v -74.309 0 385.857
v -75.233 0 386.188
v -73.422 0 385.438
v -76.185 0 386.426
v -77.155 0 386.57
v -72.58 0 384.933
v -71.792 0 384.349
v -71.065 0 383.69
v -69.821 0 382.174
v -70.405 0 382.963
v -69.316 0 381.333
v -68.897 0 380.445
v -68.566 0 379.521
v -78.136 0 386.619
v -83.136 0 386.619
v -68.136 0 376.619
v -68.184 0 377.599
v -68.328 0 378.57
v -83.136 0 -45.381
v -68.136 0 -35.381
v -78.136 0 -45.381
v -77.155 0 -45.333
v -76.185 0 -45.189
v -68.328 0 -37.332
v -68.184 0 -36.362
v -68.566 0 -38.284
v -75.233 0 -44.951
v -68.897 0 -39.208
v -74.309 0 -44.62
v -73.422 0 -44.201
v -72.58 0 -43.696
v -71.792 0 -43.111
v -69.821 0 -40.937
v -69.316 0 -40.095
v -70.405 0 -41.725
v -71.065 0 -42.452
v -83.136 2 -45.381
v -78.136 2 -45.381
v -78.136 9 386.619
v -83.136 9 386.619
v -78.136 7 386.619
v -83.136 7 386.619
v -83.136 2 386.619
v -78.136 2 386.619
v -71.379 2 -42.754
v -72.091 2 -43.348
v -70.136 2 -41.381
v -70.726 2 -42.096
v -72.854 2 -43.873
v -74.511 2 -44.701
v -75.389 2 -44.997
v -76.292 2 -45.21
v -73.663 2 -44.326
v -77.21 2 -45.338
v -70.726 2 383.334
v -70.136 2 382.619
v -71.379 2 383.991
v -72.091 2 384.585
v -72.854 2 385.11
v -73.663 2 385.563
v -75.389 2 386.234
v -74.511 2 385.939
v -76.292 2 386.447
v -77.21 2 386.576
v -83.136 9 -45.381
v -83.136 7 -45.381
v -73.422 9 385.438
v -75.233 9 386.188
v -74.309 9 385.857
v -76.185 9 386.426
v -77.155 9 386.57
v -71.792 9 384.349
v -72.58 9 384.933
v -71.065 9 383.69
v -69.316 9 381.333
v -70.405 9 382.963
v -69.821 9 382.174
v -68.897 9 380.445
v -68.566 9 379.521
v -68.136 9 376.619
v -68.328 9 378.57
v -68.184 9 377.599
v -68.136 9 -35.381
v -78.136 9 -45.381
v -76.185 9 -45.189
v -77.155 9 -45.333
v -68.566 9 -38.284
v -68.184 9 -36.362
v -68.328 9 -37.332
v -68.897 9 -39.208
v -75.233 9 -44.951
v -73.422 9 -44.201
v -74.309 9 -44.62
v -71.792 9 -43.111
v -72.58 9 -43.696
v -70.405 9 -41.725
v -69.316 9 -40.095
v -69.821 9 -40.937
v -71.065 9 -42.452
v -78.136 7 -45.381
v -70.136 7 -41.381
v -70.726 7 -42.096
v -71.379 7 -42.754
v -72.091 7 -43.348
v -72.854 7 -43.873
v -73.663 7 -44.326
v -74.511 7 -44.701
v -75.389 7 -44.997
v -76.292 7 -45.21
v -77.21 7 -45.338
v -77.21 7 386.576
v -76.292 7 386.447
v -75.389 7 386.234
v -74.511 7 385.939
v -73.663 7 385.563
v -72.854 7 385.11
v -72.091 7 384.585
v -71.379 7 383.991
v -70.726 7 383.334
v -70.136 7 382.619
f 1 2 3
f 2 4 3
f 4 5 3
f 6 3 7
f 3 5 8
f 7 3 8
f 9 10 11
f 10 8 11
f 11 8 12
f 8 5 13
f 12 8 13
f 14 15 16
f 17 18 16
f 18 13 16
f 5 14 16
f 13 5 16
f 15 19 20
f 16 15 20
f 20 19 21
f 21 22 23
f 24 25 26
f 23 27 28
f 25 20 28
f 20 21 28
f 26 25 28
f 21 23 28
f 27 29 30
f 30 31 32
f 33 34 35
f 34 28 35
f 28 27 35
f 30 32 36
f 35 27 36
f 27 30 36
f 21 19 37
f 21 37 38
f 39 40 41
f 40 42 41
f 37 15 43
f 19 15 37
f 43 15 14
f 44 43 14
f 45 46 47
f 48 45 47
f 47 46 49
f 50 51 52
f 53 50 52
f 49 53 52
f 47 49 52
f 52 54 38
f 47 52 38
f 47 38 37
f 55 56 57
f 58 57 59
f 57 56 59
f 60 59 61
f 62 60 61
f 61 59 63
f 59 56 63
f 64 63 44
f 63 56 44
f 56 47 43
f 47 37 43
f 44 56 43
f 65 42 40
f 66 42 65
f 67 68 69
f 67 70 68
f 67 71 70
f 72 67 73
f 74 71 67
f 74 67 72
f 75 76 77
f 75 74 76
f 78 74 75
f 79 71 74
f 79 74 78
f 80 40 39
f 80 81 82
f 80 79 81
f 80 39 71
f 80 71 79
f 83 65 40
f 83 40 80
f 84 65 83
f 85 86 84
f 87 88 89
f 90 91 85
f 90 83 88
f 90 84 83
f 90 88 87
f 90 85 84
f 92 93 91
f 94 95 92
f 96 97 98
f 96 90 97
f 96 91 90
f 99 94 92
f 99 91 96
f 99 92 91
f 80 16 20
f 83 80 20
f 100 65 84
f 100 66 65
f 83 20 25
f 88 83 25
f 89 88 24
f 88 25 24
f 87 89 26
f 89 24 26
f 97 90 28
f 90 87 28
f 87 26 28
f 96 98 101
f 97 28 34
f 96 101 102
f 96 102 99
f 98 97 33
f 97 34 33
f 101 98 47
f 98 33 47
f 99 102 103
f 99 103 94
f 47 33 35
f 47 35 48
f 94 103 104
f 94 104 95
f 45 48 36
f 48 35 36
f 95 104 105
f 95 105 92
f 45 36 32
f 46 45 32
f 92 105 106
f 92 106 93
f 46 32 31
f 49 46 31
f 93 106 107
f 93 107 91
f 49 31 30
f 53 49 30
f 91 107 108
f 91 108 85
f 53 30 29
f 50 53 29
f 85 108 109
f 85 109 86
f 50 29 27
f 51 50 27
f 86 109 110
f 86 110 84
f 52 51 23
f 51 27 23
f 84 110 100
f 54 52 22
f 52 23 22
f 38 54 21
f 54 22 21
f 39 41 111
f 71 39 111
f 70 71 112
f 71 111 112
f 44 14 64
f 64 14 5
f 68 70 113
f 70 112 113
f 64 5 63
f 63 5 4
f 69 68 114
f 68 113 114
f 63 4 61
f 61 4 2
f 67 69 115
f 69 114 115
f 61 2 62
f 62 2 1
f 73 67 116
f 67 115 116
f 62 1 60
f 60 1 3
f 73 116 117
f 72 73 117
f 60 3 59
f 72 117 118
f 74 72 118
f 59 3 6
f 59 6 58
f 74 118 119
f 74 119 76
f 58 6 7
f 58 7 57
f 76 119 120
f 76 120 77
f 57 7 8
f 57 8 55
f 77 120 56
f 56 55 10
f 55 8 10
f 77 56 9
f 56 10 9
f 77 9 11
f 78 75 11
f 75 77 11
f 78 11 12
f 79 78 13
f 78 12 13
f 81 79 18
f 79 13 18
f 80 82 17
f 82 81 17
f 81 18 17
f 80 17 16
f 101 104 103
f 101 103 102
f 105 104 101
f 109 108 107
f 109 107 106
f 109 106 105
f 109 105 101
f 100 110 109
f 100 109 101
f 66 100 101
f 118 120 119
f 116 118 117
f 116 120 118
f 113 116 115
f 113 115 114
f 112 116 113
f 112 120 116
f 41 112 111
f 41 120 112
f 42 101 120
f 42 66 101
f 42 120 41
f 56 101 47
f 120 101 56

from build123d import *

# Parameters (mm, degrees)
SKETCH2_W           = 15
SKETCH2_H           = 432
BOSS_EXTRUDE1_DEPTH = 9
SKETCH3_W           = 432
SKETCH3_H           = 5
CUT_EXTRUDE1_DEPTH  = 13
FILLET1_R           = 10
FILLET2_R           = 10


with BuildPart() as part:
    # Sketch2 → Boss-Extrude1 (new body)
    with BuildSketch(Plane(origin=(0, 0, 0), x_dir=(1, 0, 0), z_dir=(0, 1, 0))):
        with Locations((-75.63559322, -170.618644068)):
            Rectangle(SKETCH2_W, SKETCH2_H)
    extrude(amount=BOSS_EXTRUDE1_DEPTH)

    # Sketch3 → Cut-Extrude1 (cut)
    with BuildSketch(Plane.ZY.offset(83.13559322)):
        with Locations((170.618644068, 4.5)):
            Rectangle(SKETCH3_W, SKETCH3_H)
    extrude(amount=-CUT_EXTRUDE1_DEPTH, mode=Mode.SUBTRACT)

    # Fillet1
    # the kernel refuses this fillet: 10 mm, written as the material it takes off along each edge
    with BuildSketch(Plane(origin=(-68.13559322, -25, 386.618644068), x_dir=(0, 0, -1), z_dir=(0, 1, 0))) as fillet1_piece_1:
        with BuildLine():
            CenterArc((FILLET1_R, FILLET1_R), FILLET1_R, 180, 90)
            Line((0, FILLET1_R), (0, 0))
            Line((0, 0), (FILLET1_R, 0))
        make_face()
    extrude(amount=59, mode=Mode.SUBTRACT)

    # Fillet2
    # the kernel refuses this fillet: 10 mm, written as the material it takes off along each edge
    with BuildSketch(Plane(origin=(-68.13559322, -25, -45.381355932), x_dir=(-1, 0, 0), z_dir=(0, 1, 0))) as fillet2_piece_1:
        with BuildLine():
            CenterArc((FILLET2_R, FILLET2_R), FILLET2_R, 180, 90)
            Line((0, FILLET2_R), (0, 0))
            Line((0, 0), (FILLET2_R, 0))
        make_face()
    extrude(amount=59, mode=Mode.SUBTRACT)


solid = part.part
